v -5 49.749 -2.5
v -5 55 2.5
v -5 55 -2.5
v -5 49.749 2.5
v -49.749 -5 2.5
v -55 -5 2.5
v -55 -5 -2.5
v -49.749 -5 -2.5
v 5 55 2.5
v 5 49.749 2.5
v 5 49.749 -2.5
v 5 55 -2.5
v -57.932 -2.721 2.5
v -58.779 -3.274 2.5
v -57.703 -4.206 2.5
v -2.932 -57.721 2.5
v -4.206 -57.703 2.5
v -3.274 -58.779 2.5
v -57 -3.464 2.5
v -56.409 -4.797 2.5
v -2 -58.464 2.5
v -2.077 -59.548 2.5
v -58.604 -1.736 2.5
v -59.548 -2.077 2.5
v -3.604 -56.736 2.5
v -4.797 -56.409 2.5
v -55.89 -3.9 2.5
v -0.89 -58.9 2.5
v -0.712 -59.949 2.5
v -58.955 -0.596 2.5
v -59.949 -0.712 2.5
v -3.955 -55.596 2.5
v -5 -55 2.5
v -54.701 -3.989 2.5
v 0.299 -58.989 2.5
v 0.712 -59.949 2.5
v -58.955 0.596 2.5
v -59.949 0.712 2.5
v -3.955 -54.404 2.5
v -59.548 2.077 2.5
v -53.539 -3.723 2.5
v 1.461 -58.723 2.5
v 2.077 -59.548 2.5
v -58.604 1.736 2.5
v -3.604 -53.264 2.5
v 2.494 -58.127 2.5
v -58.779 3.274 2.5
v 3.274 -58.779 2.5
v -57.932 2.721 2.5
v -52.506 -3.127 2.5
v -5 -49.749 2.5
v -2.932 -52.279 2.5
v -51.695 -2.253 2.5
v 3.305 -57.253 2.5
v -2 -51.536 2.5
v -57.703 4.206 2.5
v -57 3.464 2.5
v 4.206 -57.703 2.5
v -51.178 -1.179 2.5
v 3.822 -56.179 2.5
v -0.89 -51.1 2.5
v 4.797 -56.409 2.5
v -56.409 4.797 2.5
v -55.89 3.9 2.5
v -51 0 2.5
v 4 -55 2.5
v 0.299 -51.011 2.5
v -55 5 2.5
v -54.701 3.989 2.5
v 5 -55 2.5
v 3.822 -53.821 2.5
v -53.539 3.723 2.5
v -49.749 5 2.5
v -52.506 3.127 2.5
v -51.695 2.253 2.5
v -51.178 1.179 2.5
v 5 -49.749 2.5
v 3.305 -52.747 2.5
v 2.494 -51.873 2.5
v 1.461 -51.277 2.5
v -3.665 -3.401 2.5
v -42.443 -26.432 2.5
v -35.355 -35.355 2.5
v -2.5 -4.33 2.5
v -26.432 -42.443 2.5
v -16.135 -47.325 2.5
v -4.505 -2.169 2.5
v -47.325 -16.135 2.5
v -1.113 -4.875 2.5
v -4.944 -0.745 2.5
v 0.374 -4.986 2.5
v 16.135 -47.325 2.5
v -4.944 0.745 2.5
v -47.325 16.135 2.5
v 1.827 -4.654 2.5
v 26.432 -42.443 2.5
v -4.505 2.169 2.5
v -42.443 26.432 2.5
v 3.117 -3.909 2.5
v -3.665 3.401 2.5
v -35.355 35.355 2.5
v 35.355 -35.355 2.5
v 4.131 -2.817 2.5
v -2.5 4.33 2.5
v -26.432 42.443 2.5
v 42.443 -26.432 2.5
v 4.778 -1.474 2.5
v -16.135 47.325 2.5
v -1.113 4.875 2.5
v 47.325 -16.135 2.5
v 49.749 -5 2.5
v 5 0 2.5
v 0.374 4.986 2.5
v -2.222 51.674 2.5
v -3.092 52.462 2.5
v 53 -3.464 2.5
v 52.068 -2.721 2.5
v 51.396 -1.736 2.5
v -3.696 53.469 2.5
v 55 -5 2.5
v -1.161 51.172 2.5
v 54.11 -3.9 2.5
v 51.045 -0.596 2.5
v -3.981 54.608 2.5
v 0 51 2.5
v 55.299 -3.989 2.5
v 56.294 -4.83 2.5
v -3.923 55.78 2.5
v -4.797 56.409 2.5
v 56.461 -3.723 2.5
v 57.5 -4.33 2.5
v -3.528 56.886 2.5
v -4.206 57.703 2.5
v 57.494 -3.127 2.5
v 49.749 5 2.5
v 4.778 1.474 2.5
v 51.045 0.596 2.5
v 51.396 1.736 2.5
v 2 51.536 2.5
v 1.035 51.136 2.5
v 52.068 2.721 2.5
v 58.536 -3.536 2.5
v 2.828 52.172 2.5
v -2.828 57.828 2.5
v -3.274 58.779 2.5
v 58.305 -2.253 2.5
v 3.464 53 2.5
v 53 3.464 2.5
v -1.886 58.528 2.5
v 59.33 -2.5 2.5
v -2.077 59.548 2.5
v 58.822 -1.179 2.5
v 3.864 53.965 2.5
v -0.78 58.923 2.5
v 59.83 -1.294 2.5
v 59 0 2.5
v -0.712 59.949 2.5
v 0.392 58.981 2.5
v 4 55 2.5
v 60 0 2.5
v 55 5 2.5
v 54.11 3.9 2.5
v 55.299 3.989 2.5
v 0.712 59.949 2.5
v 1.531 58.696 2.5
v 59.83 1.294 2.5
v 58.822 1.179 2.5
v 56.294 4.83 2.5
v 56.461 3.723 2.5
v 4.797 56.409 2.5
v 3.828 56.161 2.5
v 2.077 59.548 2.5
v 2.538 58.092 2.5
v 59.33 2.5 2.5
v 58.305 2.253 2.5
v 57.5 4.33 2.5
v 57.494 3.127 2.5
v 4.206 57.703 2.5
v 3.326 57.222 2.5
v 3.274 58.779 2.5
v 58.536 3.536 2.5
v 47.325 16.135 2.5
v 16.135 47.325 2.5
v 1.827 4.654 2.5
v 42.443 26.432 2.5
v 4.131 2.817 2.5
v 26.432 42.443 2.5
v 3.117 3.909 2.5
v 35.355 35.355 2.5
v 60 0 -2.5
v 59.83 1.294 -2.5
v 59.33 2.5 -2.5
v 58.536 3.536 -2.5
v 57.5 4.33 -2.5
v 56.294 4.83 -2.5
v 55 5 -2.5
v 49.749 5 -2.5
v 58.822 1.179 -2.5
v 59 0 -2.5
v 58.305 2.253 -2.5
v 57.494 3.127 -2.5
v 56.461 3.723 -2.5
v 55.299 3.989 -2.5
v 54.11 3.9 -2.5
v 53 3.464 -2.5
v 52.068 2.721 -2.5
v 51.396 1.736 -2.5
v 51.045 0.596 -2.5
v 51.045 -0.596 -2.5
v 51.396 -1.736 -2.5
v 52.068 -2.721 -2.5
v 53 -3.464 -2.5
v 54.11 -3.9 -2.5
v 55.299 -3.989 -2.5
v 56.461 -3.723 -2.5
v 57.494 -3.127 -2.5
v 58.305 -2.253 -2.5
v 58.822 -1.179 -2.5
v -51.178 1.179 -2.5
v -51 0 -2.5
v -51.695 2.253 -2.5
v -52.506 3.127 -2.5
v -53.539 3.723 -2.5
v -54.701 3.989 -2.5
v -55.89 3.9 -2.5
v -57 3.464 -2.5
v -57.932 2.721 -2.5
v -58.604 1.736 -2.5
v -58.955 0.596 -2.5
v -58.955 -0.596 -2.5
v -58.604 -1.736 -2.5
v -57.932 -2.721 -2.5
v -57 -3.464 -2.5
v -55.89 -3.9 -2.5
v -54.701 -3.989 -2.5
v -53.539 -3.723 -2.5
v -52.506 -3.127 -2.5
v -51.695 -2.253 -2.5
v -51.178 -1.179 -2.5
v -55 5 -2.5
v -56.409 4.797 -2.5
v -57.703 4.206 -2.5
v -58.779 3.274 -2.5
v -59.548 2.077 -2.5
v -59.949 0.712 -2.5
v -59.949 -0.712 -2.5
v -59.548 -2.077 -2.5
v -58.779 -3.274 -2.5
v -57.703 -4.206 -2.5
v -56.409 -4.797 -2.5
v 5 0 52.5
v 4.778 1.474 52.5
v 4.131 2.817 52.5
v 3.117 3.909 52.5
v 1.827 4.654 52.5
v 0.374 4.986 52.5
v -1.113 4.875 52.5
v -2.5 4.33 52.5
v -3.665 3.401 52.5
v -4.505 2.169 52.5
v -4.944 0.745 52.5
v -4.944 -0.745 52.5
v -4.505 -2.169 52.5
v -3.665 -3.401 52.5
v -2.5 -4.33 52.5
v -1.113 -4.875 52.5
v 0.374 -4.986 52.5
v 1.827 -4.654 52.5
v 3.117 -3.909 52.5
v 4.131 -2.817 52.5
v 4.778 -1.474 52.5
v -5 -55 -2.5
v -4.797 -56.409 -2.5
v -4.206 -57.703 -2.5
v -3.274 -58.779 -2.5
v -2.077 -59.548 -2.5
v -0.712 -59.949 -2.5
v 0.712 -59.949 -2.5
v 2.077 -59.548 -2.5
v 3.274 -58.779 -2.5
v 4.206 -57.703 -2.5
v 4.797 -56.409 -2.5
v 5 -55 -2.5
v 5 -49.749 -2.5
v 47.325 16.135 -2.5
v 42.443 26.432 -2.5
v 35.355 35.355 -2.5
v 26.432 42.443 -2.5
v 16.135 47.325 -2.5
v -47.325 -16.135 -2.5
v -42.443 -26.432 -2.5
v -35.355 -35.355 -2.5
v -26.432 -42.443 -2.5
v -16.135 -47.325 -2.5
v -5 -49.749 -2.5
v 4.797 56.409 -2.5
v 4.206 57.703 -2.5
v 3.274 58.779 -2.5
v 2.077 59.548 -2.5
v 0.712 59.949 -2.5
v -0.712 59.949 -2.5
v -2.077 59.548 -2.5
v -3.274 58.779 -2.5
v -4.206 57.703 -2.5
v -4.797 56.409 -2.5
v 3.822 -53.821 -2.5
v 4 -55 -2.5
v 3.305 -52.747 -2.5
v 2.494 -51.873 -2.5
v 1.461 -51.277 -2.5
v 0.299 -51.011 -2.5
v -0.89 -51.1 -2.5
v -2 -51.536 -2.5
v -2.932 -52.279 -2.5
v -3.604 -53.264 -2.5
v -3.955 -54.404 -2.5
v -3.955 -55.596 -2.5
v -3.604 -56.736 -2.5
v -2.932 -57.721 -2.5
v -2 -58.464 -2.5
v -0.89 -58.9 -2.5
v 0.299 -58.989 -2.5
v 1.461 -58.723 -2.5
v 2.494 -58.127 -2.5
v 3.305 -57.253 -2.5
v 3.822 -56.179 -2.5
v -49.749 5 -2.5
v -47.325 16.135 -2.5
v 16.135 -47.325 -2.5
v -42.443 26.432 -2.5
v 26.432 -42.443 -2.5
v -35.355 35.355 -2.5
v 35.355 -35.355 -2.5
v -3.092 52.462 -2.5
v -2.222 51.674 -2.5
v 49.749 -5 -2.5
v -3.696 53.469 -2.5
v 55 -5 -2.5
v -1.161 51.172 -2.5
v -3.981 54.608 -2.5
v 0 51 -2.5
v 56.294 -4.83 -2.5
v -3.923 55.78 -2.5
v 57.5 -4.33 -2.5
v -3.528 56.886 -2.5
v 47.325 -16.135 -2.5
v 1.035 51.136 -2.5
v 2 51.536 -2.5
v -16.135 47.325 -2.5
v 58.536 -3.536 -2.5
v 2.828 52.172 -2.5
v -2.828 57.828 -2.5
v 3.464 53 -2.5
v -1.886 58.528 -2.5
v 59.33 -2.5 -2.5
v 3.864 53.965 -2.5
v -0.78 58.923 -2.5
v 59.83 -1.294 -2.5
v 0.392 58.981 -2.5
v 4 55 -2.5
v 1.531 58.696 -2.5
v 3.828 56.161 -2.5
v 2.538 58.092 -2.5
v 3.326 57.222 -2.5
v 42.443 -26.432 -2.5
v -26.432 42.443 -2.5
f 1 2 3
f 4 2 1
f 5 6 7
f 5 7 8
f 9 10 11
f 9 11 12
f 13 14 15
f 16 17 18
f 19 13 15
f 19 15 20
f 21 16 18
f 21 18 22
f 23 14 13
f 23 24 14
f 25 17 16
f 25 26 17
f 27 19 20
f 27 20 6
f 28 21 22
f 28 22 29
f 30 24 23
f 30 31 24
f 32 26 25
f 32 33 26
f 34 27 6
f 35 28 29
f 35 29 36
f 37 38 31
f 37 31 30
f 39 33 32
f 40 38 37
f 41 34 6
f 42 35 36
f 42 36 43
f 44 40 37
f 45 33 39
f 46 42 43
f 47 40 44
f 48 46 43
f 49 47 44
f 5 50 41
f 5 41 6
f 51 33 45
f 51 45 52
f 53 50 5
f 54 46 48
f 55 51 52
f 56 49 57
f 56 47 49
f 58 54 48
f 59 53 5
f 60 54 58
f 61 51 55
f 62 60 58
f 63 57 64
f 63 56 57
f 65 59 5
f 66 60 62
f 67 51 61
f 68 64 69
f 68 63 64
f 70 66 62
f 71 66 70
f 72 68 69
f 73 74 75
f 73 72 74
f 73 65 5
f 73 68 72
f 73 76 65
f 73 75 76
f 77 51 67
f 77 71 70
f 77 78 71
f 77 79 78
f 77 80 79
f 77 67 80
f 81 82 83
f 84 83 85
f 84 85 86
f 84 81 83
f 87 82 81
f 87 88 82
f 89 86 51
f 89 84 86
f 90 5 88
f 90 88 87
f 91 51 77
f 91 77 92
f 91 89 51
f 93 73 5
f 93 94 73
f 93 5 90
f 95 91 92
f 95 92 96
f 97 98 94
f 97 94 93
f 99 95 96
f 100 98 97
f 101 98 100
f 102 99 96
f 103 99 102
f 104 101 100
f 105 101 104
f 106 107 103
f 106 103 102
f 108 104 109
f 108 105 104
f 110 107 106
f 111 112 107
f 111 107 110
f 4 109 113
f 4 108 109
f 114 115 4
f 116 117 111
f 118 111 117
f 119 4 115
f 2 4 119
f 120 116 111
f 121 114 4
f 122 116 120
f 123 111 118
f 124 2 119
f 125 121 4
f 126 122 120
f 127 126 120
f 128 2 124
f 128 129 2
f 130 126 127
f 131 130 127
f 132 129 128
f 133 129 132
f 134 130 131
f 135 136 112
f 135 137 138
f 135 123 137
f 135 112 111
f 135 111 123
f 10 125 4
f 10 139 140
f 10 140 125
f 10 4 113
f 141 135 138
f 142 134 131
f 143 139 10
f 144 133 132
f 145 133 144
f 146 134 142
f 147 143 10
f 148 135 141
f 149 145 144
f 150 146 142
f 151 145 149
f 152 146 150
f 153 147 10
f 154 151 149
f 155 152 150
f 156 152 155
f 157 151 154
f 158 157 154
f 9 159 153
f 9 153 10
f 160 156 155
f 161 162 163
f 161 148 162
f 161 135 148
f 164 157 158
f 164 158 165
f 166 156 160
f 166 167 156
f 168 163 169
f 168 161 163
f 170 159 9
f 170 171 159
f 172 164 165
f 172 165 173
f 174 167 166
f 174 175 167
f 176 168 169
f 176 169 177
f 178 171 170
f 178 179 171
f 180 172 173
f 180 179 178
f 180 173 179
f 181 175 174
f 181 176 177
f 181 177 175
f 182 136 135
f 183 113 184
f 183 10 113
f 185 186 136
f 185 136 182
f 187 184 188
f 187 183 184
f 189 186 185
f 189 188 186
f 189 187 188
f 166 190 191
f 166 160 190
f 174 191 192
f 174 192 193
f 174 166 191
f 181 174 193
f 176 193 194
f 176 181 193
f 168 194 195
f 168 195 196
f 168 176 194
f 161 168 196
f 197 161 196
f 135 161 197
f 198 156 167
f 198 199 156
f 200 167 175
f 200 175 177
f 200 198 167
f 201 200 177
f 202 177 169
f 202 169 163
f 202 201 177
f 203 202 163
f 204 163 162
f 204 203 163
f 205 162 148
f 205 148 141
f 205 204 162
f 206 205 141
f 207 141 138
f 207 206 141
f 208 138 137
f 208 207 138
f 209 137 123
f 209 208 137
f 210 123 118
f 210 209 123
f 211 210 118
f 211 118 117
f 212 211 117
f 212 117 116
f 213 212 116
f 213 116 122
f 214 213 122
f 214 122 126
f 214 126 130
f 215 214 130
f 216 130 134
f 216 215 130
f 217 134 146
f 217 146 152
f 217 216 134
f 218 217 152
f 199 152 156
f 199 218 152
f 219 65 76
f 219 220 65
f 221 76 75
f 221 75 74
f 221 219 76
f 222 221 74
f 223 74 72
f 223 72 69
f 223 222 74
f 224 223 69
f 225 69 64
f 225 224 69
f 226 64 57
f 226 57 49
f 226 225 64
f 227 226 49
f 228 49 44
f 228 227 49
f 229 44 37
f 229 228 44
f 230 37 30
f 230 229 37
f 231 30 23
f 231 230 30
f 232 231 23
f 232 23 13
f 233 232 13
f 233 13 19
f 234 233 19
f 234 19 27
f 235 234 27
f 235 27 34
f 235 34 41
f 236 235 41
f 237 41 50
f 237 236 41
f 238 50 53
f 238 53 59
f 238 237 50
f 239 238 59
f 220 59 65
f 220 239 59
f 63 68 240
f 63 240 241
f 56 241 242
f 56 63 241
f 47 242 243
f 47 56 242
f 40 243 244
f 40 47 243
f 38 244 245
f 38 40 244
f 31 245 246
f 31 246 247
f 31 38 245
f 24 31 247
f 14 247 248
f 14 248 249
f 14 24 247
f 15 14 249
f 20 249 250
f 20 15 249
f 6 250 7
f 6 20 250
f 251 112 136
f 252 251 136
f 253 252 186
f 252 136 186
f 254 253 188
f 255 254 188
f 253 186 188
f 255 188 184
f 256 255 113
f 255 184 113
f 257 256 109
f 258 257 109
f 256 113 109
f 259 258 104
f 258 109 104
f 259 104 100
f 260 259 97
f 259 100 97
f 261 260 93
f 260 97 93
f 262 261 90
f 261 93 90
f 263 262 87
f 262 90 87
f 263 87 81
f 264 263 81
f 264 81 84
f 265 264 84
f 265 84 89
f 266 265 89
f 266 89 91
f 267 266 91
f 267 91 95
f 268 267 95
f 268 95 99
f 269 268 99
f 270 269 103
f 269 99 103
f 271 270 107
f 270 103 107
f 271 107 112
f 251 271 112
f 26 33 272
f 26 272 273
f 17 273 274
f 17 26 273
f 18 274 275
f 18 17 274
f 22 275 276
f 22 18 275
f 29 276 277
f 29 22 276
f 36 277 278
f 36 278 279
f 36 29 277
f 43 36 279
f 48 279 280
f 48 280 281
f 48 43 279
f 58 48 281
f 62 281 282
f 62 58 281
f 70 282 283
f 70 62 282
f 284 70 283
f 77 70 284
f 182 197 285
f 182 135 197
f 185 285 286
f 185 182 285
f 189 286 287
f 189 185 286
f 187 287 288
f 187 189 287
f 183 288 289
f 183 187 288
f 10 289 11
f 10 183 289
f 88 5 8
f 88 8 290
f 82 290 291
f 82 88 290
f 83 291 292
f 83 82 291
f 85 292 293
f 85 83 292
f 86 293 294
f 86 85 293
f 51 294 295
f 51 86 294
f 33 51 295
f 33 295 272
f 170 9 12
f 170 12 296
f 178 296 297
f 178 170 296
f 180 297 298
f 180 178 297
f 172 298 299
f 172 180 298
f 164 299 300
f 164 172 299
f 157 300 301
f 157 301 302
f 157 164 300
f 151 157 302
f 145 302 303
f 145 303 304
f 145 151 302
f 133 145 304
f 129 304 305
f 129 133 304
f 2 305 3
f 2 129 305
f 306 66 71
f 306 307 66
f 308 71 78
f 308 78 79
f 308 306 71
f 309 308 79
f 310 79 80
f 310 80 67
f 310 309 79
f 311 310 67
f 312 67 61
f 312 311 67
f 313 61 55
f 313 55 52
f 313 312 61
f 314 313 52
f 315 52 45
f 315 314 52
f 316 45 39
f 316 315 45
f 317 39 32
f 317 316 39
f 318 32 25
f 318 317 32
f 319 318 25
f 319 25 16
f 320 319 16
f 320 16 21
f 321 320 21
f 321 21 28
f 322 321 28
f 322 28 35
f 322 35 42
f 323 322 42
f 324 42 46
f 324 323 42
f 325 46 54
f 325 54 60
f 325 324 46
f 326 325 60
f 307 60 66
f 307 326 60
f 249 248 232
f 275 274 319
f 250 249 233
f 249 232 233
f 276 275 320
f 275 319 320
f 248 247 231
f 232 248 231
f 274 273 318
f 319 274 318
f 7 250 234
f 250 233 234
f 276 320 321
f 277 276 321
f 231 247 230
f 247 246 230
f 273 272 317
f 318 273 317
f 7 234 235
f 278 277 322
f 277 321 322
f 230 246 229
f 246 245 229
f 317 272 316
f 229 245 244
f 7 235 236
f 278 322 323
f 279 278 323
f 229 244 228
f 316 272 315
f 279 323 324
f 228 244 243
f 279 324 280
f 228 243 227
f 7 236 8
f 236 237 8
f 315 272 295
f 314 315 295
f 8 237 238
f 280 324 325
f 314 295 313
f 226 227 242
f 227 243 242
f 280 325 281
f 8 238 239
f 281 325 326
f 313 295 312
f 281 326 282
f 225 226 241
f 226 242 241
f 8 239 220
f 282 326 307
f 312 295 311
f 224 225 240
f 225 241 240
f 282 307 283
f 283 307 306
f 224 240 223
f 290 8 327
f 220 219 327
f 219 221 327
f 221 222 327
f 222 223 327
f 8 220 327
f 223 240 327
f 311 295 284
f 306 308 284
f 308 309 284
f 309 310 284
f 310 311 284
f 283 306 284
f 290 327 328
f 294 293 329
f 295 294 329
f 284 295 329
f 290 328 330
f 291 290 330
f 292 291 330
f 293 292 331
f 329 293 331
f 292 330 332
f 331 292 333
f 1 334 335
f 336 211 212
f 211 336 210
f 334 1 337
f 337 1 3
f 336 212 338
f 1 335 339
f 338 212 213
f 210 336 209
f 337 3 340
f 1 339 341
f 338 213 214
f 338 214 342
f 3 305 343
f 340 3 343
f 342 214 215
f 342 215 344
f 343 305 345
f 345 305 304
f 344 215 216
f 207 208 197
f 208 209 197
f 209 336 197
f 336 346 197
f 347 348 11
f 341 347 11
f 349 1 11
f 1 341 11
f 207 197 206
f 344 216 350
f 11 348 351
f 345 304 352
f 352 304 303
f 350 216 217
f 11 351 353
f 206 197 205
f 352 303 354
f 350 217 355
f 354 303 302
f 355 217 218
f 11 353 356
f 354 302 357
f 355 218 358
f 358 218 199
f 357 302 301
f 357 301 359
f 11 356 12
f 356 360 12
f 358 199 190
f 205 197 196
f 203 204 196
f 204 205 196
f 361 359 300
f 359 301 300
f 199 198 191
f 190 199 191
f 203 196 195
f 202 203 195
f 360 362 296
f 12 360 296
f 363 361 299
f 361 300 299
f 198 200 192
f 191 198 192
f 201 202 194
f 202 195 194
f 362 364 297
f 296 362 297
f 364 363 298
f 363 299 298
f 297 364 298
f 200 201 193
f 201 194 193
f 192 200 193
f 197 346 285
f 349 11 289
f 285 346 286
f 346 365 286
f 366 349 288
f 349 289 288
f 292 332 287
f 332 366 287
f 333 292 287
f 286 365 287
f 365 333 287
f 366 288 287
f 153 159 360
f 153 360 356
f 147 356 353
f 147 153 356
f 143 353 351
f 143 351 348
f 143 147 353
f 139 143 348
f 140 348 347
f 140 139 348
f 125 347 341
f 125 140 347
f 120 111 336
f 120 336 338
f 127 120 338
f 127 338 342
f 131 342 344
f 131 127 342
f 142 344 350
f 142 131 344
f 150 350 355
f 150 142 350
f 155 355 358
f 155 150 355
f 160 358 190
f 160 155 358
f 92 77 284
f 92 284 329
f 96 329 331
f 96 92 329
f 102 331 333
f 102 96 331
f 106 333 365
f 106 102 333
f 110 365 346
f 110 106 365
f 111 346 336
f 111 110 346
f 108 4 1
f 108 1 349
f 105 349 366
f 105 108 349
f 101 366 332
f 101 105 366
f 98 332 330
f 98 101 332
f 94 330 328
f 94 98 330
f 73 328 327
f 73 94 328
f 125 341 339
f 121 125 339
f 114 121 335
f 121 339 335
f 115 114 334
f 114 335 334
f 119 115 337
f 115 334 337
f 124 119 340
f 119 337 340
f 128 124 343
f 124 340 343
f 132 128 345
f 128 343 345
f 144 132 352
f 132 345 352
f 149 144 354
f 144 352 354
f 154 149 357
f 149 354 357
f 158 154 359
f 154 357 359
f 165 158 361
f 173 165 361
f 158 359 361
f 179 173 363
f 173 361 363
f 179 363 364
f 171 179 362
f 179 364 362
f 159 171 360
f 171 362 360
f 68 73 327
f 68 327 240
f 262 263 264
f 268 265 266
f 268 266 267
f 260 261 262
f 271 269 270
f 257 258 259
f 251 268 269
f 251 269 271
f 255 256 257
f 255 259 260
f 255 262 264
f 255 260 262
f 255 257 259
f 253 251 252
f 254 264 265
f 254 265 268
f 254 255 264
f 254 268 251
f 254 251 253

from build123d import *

# Parameters (mm, degrees)
F0_R     = 4
F1_DEPTH = 2.5
F2_R     = 5
F3_DEPTH = 50


with BuildPart() as f1:
    # F0 (on Top) → F1 (new body, symmetric)
    with BuildSketch(Plane.XY):
        with BuildLine():
            ThreePointArc((49.749372, -5), (49.937304, -2.503139), (50, 0))
            ThreePointArc((50, 0), (49.937304, 2.503139), (49.749372, 5))
            ThreePointArc((49.749372, 5), (35.355339, 35.355339), (5, 49.749372))
            ThreePointArc((5, 49.749372), (2.503139, 49.937304), (0, 50))
            ThreePointArc((0, 50), (-2.503139, 49.937304), (-5, 49.749372))
            ThreePointArc((-5, 49.749372), (-35.355339, 35.355339), (-49.749372, 5))
            ThreePointArc((-49.749372, 5), (-49.937304, 2.503139), (-50, 0))
            ThreePointArc((-50, 0), (-49.937304, -2.503139), (-49.749372, -5))
            ThreePointArc((-49.749372, -5), (-35.355339, -35.355339), (-5, -49.749372))
            ThreePointArc((-5, -49.749372), (-2.503139, -49.937304), (0, -50))
            ThreePointArc((0, -50), (2.503139, -49.937304), (5, -49.749372))
            ThreePointArc((5, -49.749372), (35.355339, -35.355339), (49.749372, -5))
        make_face()
        with BuildLine():
            ThreePointArc((-5, 55), (-3.535534, 51.464466), (0, 50))
            ThreePointArc((0, 50), (3.535534, 51.464466), (5, 55))
            ThreePointArc((5, 55), (0, 60), (-5, 55))
        make_face()
        with BuildLine():
            ThreePointArc((4, 55), (2.828427, 52.171573), (0, 51))
            ThreePointArc((0, 51), (-2.828427, 57.828427), (4, 55))
        make_face(mode=Mode.SUBTRACT)
        with BuildLine():
            ThreePointArc((-5, 49.749372), (-2.503139, 49.937304), (0, 50))
            ThreePointArc((0, 50), (-3.535534, 51.464466), (-5, 55))
            Line((-5, 55), (-5, 49.749372))
        make_face()
        with BuildLine():
            ThreePointArc((0, 50), (2.503139, 49.937304), (5, 49.749372))
            Line((5, 49.749372), (5, 55))
            ThreePointArc((5, 55), (3.535534, 51.464466), (0, 50))
        make_face()
        with BuildLine():
            ThreePointArc((55, 5), (51.464466, 3.535534), (50, 0))
            ThreePointArc((50, 0), (51.464466, -3.535534), (55, -5))
            ThreePointArc((55, -5), (58.535534, -3.535534), (60, 0))
            ThreePointArc((60, 0), (58.535534, 3.535534), (55, 5))
        make_face()
        with Locations((55, 0)):
            Circle(F0_R, mode=Mode.SUBTRACT)
        with BuildLine():
            ThreePointArc((55, -5), (51.464466, -3.535534), (50, 0))
            ThreePointArc((50, 0), (49.937304, -2.503139), (49.749372, -5))
            Line((49.749372, -5), (55, -5))
        make_face()
        with BuildLine():
            ThreePointArc((49.749372, 5), (49.937304, 2.503139), (50, 0))
            ThreePointArc((50, 0), (51.464466, 3.535534), (55, 5))
            Line((55, 5), (49.749372, 5))
        make_face()
        with BuildLine():
            Line((5, -55), (5, -49.749372))
            ThreePointArc((5, -49.749372), (2.503139, -49.937304), (0, -50))
            ThreePointArc((0, -50), (3.535534, -51.464466), (5, -55))
        make_face()
        with BuildLine():
            ThreePointArc((-5, -55), (-3.535534, -51.464466), (0, -50))
            ThreePointArc((0, -50), (-2.503139, -49.937304), (-5, -49.749372))
            Line((-5, -49.749372), (-5, -55))
        make_face()
        with BuildLine():
            ThreePointArc((5, -55), (3.535534, -51.464466), (0, -50))
            ThreePointArc((0, -50), (-3.535534, -51.464466), (-5, -55))
            ThreePointArc((-5, -55), (0, -60), (5, -55))
        make_face()
        with Locations((0, -55)):
            Circle(F0_R, mode=Mode.SUBTRACT)
        with BuildLine():
            ThreePointArc((-55, -5), (-51.464466, -3.535534), (-50, 0))
            ThreePointArc((-50, 0), (-51.464466, 3.535534), (-55, 5))
            ThreePointArc((-55, 5), (-60, 0), (-55, -5))
        make_face()
        with Locations((-55, 0)):
            Circle(F0_R, mode=Mode.SUBTRACT)
        with BuildLine():
            Line((-55, -5), (-49.749372, -5))
            ThreePointArc((-49.749372, -5), (-49.937304, -2.503139), (-50, 0))
            ThreePointArc((-50, 0), (-51.464466, -3.535534), (-55, -5))
        make_face()
        with BuildLine():
            ThreePointArc((-50, 0), (-49.937304, 2.503139), (-49.749372, 5))
            Line((-49.749372, 5), (-55, 5))
            ThreePointArc((-55, 5), (-51.464466, 3.535534), (-50, 0))
        make_face()
    extrude(amount=F1_DEPTH, both=True)

    # F2 (on face) → F3 (join)
    with BuildSketch(Plane.XY.offset(2.5)):
        Circle(F2_R)
    extrude(amount=F3_DEPTH)


solid = f1.part
